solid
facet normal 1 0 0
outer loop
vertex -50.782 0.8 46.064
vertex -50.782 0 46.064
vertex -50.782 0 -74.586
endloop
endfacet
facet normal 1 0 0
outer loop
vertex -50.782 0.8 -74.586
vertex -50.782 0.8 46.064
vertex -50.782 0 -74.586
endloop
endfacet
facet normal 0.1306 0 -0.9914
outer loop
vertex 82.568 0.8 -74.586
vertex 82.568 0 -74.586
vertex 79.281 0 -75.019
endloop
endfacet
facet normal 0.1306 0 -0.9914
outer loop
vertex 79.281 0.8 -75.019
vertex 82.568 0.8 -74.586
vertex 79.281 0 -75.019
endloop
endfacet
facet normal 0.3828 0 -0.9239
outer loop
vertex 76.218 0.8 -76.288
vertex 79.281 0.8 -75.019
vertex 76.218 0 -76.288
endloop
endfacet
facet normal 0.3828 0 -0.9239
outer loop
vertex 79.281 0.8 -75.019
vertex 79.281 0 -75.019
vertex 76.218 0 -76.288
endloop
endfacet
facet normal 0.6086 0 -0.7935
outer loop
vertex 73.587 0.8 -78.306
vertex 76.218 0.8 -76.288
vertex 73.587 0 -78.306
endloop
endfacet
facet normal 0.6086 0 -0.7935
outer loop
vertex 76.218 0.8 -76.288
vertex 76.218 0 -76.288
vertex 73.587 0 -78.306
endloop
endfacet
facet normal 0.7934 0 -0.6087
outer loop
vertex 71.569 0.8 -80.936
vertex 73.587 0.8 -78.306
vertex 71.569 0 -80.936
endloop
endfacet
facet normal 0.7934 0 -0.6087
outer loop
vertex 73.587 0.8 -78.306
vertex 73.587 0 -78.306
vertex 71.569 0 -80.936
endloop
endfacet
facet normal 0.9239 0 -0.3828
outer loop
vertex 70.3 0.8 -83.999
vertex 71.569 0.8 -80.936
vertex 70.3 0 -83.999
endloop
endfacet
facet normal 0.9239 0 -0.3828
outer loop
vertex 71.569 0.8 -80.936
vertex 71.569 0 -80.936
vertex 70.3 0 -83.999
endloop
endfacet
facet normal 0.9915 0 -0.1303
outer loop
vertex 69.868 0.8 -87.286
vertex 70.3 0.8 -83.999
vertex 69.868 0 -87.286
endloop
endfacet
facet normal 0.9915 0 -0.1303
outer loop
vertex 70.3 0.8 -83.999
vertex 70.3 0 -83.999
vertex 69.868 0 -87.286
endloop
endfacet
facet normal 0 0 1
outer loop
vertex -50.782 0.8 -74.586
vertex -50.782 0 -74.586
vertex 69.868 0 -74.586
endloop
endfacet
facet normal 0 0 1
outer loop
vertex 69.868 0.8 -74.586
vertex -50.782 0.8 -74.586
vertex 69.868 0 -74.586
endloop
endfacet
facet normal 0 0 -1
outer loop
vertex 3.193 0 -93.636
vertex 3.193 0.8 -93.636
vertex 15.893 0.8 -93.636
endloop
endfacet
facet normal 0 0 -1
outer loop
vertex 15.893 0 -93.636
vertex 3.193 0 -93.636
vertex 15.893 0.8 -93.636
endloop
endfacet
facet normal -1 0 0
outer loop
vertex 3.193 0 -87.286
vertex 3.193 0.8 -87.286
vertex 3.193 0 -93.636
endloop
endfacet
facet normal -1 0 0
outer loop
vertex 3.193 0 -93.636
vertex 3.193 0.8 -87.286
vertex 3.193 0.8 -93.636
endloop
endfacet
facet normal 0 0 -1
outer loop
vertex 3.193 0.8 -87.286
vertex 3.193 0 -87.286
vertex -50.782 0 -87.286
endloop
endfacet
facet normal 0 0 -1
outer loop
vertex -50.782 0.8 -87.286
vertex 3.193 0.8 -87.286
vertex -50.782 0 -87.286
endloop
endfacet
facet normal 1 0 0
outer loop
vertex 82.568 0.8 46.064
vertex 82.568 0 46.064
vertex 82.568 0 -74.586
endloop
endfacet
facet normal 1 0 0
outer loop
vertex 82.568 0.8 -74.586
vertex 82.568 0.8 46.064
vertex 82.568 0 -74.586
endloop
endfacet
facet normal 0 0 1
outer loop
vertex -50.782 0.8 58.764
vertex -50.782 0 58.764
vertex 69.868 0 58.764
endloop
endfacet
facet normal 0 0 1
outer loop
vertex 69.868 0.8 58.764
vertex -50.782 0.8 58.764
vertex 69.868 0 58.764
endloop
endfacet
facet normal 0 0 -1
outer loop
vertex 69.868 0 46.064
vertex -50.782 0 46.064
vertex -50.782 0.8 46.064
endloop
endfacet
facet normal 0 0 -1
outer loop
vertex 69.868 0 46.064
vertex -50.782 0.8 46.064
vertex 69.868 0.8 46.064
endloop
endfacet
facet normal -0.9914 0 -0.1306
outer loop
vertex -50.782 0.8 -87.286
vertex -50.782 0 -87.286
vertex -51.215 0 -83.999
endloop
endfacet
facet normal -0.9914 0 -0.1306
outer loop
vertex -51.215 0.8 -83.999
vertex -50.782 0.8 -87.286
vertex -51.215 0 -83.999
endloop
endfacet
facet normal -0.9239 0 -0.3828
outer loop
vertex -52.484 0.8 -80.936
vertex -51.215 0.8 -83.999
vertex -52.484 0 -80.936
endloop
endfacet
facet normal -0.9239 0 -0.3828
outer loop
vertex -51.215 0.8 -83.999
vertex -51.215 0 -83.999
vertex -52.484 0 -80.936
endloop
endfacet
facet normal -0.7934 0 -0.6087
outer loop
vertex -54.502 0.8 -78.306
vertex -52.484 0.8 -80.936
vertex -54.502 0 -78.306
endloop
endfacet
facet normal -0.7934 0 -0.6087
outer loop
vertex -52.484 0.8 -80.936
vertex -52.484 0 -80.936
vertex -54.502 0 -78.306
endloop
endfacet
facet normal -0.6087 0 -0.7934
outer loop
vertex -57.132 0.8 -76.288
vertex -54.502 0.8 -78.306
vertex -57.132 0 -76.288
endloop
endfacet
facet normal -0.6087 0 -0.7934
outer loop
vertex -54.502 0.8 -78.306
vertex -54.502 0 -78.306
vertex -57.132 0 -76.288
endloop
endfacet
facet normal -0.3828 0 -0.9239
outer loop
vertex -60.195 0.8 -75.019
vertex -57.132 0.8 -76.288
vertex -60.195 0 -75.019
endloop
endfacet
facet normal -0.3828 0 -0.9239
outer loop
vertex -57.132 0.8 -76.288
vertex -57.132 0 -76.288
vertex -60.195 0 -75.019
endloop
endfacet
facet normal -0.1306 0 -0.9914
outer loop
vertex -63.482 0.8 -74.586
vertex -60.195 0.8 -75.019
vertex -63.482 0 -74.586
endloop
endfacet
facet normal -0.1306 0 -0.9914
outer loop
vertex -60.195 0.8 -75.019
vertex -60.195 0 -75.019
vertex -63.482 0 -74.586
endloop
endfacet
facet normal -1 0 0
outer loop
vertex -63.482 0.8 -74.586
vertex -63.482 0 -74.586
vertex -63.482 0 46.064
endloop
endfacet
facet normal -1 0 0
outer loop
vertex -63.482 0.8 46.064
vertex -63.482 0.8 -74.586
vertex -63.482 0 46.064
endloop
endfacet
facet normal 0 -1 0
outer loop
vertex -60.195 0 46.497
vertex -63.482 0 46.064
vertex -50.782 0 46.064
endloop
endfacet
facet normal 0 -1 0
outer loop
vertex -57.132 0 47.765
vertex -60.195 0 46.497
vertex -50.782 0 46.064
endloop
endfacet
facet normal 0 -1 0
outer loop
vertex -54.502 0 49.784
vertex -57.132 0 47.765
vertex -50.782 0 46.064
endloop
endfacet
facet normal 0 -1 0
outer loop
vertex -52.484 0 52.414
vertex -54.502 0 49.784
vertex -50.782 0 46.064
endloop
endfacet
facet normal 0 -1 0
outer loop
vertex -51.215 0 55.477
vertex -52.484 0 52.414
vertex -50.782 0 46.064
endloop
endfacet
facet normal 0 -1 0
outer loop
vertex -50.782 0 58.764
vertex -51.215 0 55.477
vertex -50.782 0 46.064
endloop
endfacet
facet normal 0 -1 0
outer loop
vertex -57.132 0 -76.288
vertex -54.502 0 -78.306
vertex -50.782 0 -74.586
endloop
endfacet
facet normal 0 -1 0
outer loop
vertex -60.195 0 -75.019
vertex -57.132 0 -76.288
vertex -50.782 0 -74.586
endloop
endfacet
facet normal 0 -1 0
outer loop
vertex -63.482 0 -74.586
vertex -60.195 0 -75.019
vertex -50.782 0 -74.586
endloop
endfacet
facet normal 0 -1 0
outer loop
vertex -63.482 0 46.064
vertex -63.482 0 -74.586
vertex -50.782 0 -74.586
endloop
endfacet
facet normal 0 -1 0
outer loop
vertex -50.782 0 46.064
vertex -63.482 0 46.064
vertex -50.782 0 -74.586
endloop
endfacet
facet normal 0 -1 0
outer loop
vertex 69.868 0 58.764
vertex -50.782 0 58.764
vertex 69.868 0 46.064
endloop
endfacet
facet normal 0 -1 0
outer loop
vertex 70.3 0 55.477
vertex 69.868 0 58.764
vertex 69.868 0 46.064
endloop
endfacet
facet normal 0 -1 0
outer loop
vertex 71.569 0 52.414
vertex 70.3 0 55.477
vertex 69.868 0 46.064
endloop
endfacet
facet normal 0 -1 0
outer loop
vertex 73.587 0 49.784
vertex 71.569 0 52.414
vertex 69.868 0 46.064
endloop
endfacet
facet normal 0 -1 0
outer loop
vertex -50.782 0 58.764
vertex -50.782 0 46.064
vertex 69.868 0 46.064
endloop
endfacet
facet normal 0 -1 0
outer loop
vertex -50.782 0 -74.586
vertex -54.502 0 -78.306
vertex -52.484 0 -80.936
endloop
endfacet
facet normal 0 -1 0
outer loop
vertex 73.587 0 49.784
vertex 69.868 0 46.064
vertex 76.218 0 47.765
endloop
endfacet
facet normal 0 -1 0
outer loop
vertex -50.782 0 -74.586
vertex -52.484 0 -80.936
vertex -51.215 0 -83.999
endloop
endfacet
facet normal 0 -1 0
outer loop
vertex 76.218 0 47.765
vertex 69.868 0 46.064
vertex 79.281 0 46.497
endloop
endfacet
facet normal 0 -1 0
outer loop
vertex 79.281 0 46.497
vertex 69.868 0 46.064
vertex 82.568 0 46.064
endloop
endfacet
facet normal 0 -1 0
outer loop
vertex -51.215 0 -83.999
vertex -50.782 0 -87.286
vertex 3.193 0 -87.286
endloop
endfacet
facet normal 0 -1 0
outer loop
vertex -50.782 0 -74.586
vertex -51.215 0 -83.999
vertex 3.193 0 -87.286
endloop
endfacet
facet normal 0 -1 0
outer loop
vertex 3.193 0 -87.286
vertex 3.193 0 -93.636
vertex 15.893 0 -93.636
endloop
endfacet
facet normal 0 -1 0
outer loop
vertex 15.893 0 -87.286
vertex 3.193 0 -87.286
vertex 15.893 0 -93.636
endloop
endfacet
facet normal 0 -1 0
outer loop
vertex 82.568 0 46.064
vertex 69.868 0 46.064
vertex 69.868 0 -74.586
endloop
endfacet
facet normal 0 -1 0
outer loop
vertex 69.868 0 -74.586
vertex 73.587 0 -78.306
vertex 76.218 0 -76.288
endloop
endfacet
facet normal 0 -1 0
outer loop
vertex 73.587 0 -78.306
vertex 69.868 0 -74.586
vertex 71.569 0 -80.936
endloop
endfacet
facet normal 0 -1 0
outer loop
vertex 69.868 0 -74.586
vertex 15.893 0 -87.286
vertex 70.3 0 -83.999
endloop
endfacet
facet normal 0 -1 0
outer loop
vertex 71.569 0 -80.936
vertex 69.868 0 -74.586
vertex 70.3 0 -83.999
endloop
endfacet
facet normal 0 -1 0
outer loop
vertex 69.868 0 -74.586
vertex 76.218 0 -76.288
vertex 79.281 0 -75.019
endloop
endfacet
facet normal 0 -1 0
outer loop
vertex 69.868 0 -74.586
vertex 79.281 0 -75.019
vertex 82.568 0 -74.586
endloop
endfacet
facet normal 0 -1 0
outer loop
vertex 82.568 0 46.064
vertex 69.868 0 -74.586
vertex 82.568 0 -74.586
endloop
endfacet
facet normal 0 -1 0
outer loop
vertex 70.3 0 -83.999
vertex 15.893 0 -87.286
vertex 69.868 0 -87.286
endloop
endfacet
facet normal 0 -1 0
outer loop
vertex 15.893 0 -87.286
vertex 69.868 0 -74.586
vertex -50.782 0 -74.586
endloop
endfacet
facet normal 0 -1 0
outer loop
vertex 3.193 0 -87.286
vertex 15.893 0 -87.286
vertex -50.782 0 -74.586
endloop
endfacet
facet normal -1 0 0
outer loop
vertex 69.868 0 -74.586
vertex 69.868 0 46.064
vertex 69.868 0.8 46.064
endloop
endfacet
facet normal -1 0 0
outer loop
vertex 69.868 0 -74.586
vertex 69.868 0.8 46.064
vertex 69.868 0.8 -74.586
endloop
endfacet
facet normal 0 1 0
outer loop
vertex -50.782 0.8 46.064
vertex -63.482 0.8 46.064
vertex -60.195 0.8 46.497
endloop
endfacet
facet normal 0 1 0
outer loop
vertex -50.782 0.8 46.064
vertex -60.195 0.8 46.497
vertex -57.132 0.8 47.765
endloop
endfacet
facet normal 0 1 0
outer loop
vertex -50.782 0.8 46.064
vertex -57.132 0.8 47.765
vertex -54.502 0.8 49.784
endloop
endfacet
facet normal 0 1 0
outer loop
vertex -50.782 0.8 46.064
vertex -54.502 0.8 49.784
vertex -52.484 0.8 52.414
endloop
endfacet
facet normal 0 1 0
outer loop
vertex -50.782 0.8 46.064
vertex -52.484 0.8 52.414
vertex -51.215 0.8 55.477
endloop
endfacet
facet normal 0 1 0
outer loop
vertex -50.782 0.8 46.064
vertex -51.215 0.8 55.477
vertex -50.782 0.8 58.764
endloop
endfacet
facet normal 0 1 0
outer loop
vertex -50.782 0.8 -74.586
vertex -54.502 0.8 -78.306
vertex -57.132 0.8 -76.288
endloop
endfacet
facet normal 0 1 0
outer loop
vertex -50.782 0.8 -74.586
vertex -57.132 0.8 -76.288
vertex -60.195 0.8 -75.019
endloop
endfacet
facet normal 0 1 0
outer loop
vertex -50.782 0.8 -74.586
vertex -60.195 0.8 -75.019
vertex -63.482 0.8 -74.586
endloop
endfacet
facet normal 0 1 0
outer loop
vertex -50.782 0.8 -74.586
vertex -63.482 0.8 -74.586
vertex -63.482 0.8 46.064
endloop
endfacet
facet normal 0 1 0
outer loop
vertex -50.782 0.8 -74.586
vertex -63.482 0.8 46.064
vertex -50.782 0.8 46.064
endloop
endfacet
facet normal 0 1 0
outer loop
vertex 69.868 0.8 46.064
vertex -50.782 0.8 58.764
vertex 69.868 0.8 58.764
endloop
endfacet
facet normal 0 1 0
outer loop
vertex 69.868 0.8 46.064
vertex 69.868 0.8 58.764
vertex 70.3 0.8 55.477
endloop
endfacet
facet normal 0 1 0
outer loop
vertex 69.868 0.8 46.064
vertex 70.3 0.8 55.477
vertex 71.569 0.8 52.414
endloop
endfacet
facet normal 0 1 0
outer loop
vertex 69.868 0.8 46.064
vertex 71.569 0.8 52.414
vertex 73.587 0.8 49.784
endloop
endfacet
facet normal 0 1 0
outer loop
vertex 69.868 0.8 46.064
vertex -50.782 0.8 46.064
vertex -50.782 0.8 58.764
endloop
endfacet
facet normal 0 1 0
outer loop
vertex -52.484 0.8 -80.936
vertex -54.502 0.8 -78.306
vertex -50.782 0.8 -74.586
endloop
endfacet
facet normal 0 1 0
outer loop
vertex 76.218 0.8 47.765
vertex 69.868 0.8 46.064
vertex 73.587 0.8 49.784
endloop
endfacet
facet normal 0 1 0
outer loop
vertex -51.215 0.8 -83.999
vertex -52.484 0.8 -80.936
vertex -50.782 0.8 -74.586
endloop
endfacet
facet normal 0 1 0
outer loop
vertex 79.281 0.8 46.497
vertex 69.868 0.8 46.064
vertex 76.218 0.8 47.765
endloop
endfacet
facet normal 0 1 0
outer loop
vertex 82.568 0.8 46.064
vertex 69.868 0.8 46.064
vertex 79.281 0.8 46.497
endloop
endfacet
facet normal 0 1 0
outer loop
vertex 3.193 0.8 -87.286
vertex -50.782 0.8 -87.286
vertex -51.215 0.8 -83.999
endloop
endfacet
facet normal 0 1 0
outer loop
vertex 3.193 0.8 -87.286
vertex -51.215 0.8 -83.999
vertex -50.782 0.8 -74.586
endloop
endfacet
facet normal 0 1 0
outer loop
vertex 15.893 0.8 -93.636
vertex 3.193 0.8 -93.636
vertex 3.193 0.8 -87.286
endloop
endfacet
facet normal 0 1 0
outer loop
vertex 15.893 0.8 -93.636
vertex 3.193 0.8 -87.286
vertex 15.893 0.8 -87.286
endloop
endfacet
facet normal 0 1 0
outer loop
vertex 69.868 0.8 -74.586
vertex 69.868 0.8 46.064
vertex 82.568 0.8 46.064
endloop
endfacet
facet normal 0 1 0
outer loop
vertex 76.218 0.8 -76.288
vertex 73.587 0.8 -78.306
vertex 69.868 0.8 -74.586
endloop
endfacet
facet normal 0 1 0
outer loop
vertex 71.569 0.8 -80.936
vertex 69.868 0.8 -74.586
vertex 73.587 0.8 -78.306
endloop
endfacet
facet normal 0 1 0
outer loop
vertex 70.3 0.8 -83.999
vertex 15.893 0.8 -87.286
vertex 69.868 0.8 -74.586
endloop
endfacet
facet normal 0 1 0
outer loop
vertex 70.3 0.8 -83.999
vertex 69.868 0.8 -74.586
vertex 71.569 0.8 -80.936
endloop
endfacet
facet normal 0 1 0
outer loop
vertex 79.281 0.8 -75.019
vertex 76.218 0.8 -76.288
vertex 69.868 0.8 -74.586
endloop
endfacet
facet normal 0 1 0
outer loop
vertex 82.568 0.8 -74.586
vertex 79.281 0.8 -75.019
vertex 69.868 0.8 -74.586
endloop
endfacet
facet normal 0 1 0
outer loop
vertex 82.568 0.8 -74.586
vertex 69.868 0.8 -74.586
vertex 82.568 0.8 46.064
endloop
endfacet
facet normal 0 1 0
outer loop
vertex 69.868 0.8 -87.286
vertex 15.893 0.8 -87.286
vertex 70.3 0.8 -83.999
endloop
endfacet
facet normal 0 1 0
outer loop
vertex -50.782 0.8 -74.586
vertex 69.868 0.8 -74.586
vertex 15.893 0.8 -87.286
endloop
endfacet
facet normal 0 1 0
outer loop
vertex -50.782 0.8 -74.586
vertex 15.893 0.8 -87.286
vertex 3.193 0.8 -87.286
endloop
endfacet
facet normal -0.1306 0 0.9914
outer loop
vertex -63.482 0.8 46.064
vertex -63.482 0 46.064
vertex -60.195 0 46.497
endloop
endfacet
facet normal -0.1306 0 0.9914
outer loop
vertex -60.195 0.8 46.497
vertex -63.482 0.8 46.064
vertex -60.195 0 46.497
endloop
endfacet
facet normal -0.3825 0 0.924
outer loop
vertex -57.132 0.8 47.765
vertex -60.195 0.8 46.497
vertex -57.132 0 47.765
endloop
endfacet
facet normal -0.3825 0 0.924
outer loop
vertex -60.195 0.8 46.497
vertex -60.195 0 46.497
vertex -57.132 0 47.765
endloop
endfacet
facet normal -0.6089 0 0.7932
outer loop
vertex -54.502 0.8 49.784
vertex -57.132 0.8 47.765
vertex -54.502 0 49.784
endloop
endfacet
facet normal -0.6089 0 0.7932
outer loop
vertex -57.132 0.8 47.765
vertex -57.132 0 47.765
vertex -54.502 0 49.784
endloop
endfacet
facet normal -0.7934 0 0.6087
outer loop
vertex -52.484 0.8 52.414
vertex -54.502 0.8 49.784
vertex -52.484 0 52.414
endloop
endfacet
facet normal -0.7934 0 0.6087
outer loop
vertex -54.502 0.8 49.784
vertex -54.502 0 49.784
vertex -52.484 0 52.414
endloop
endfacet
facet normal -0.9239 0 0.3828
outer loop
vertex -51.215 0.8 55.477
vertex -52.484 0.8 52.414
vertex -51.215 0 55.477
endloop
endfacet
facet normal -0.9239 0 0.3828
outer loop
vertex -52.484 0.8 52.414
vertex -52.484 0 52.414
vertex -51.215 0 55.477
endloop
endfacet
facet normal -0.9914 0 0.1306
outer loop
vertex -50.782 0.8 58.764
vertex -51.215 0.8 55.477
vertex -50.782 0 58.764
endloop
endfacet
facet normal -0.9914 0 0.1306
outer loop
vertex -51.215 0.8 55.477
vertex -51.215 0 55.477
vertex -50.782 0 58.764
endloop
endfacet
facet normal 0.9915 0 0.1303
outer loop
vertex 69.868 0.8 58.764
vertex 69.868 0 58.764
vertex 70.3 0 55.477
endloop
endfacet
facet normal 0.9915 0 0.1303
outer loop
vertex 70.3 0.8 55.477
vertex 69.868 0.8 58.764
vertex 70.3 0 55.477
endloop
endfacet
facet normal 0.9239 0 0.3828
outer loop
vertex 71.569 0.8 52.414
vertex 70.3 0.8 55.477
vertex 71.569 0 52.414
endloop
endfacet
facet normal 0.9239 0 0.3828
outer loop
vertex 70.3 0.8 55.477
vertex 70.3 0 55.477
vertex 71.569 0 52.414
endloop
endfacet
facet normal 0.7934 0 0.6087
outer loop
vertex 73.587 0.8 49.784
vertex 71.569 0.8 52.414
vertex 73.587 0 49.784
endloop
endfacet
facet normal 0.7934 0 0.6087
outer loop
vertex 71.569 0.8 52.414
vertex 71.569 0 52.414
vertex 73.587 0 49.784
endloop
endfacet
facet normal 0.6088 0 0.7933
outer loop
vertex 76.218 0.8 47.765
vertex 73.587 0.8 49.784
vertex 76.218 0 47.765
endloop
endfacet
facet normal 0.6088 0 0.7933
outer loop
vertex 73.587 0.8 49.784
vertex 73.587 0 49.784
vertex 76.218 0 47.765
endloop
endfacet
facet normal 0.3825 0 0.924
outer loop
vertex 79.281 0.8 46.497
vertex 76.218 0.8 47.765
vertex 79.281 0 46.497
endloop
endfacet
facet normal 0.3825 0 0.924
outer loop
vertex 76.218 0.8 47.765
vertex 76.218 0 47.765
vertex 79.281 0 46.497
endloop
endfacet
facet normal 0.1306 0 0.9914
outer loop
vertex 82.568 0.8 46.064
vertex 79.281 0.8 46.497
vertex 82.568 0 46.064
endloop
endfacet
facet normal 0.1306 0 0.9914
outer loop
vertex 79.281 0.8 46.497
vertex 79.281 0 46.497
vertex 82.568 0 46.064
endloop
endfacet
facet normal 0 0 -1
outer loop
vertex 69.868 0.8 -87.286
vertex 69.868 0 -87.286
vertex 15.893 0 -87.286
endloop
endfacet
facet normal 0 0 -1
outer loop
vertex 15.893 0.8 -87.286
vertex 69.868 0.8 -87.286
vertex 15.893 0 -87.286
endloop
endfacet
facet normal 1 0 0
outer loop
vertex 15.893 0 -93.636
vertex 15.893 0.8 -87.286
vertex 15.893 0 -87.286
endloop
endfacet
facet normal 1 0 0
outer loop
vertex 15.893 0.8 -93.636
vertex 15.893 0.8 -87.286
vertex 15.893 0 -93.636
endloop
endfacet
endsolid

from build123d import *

# Parameters (mm, degrees)
SKETCH1_W           = 120.65
SKETCH1_H           = 120.65
BOSS_EXTRUDE1_DEPTH = 0.8
SKETCH2_W           = 12.7
SKETCH2_H           = 6.35
BOSS_EXTRUDE2_DEPTH = 0.8


with BuildPart() as part:
    # Sketch1 → Boss-Extrude1 (new body)
    with BuildSketch(Plane(origin=(0, 0, 0), x_dir=(1, 0, 0), z_dir=(0, 1, 0))):
        with BuildLine():
            Line((69.867533733, 87.286057649), (-50.782466267, 87.286057649))
            ThreePointArc((-50.782466267, 87.286057649), (-54.502210146, 78.305801528), (-63.482466267, 74.586057649))
            Line((-63.482466267, 74.586057649), (-63.482466267, -46.063942351))
            ThreePointArc((-63.482466267, -46.063942351), (-54.502210146, -49.78368623), (-50.782466267, -58.763942351))
            Line((-50.782466267, -58.763942351), (69.867533733, -58.763942351))
            ThreePointArc((69.867533733, -58.763942351), (73.587277612, -49.78368623), (82.567533733, -46.063942351))
            Line((82.567533733, -46.063942351), (82.567533733, 74.586057649))
            ThreePointArc((82.567533733, 74.586057649), (73.587277612, 78.305801528), (69.867533733, 87.286057649))
        make_face()
        with Locations((9.542533733, 14.261057649)):
            Rectangle(SKETCH1_W, SKETCH1_H, mode=Mode.SUBTRACT)
    extrude(amount=BOSS_EXTRUDE1_DEPTH)

    # Sketch2 → Boss-Extrude2 (add)
    with BuildSketch(Plane(origin=(0, 0.8, 0), x_dir=(1, 0, 0), z_dir=(0, 1, 0))):
        with Locations((9.542533733, 90.461057649)):
            Rectangle(SKETCH2_W, SKETCH2_H)
    extrude(amount=-BOSS_EXTRUDE2_DEPTH)


solid = part.part
